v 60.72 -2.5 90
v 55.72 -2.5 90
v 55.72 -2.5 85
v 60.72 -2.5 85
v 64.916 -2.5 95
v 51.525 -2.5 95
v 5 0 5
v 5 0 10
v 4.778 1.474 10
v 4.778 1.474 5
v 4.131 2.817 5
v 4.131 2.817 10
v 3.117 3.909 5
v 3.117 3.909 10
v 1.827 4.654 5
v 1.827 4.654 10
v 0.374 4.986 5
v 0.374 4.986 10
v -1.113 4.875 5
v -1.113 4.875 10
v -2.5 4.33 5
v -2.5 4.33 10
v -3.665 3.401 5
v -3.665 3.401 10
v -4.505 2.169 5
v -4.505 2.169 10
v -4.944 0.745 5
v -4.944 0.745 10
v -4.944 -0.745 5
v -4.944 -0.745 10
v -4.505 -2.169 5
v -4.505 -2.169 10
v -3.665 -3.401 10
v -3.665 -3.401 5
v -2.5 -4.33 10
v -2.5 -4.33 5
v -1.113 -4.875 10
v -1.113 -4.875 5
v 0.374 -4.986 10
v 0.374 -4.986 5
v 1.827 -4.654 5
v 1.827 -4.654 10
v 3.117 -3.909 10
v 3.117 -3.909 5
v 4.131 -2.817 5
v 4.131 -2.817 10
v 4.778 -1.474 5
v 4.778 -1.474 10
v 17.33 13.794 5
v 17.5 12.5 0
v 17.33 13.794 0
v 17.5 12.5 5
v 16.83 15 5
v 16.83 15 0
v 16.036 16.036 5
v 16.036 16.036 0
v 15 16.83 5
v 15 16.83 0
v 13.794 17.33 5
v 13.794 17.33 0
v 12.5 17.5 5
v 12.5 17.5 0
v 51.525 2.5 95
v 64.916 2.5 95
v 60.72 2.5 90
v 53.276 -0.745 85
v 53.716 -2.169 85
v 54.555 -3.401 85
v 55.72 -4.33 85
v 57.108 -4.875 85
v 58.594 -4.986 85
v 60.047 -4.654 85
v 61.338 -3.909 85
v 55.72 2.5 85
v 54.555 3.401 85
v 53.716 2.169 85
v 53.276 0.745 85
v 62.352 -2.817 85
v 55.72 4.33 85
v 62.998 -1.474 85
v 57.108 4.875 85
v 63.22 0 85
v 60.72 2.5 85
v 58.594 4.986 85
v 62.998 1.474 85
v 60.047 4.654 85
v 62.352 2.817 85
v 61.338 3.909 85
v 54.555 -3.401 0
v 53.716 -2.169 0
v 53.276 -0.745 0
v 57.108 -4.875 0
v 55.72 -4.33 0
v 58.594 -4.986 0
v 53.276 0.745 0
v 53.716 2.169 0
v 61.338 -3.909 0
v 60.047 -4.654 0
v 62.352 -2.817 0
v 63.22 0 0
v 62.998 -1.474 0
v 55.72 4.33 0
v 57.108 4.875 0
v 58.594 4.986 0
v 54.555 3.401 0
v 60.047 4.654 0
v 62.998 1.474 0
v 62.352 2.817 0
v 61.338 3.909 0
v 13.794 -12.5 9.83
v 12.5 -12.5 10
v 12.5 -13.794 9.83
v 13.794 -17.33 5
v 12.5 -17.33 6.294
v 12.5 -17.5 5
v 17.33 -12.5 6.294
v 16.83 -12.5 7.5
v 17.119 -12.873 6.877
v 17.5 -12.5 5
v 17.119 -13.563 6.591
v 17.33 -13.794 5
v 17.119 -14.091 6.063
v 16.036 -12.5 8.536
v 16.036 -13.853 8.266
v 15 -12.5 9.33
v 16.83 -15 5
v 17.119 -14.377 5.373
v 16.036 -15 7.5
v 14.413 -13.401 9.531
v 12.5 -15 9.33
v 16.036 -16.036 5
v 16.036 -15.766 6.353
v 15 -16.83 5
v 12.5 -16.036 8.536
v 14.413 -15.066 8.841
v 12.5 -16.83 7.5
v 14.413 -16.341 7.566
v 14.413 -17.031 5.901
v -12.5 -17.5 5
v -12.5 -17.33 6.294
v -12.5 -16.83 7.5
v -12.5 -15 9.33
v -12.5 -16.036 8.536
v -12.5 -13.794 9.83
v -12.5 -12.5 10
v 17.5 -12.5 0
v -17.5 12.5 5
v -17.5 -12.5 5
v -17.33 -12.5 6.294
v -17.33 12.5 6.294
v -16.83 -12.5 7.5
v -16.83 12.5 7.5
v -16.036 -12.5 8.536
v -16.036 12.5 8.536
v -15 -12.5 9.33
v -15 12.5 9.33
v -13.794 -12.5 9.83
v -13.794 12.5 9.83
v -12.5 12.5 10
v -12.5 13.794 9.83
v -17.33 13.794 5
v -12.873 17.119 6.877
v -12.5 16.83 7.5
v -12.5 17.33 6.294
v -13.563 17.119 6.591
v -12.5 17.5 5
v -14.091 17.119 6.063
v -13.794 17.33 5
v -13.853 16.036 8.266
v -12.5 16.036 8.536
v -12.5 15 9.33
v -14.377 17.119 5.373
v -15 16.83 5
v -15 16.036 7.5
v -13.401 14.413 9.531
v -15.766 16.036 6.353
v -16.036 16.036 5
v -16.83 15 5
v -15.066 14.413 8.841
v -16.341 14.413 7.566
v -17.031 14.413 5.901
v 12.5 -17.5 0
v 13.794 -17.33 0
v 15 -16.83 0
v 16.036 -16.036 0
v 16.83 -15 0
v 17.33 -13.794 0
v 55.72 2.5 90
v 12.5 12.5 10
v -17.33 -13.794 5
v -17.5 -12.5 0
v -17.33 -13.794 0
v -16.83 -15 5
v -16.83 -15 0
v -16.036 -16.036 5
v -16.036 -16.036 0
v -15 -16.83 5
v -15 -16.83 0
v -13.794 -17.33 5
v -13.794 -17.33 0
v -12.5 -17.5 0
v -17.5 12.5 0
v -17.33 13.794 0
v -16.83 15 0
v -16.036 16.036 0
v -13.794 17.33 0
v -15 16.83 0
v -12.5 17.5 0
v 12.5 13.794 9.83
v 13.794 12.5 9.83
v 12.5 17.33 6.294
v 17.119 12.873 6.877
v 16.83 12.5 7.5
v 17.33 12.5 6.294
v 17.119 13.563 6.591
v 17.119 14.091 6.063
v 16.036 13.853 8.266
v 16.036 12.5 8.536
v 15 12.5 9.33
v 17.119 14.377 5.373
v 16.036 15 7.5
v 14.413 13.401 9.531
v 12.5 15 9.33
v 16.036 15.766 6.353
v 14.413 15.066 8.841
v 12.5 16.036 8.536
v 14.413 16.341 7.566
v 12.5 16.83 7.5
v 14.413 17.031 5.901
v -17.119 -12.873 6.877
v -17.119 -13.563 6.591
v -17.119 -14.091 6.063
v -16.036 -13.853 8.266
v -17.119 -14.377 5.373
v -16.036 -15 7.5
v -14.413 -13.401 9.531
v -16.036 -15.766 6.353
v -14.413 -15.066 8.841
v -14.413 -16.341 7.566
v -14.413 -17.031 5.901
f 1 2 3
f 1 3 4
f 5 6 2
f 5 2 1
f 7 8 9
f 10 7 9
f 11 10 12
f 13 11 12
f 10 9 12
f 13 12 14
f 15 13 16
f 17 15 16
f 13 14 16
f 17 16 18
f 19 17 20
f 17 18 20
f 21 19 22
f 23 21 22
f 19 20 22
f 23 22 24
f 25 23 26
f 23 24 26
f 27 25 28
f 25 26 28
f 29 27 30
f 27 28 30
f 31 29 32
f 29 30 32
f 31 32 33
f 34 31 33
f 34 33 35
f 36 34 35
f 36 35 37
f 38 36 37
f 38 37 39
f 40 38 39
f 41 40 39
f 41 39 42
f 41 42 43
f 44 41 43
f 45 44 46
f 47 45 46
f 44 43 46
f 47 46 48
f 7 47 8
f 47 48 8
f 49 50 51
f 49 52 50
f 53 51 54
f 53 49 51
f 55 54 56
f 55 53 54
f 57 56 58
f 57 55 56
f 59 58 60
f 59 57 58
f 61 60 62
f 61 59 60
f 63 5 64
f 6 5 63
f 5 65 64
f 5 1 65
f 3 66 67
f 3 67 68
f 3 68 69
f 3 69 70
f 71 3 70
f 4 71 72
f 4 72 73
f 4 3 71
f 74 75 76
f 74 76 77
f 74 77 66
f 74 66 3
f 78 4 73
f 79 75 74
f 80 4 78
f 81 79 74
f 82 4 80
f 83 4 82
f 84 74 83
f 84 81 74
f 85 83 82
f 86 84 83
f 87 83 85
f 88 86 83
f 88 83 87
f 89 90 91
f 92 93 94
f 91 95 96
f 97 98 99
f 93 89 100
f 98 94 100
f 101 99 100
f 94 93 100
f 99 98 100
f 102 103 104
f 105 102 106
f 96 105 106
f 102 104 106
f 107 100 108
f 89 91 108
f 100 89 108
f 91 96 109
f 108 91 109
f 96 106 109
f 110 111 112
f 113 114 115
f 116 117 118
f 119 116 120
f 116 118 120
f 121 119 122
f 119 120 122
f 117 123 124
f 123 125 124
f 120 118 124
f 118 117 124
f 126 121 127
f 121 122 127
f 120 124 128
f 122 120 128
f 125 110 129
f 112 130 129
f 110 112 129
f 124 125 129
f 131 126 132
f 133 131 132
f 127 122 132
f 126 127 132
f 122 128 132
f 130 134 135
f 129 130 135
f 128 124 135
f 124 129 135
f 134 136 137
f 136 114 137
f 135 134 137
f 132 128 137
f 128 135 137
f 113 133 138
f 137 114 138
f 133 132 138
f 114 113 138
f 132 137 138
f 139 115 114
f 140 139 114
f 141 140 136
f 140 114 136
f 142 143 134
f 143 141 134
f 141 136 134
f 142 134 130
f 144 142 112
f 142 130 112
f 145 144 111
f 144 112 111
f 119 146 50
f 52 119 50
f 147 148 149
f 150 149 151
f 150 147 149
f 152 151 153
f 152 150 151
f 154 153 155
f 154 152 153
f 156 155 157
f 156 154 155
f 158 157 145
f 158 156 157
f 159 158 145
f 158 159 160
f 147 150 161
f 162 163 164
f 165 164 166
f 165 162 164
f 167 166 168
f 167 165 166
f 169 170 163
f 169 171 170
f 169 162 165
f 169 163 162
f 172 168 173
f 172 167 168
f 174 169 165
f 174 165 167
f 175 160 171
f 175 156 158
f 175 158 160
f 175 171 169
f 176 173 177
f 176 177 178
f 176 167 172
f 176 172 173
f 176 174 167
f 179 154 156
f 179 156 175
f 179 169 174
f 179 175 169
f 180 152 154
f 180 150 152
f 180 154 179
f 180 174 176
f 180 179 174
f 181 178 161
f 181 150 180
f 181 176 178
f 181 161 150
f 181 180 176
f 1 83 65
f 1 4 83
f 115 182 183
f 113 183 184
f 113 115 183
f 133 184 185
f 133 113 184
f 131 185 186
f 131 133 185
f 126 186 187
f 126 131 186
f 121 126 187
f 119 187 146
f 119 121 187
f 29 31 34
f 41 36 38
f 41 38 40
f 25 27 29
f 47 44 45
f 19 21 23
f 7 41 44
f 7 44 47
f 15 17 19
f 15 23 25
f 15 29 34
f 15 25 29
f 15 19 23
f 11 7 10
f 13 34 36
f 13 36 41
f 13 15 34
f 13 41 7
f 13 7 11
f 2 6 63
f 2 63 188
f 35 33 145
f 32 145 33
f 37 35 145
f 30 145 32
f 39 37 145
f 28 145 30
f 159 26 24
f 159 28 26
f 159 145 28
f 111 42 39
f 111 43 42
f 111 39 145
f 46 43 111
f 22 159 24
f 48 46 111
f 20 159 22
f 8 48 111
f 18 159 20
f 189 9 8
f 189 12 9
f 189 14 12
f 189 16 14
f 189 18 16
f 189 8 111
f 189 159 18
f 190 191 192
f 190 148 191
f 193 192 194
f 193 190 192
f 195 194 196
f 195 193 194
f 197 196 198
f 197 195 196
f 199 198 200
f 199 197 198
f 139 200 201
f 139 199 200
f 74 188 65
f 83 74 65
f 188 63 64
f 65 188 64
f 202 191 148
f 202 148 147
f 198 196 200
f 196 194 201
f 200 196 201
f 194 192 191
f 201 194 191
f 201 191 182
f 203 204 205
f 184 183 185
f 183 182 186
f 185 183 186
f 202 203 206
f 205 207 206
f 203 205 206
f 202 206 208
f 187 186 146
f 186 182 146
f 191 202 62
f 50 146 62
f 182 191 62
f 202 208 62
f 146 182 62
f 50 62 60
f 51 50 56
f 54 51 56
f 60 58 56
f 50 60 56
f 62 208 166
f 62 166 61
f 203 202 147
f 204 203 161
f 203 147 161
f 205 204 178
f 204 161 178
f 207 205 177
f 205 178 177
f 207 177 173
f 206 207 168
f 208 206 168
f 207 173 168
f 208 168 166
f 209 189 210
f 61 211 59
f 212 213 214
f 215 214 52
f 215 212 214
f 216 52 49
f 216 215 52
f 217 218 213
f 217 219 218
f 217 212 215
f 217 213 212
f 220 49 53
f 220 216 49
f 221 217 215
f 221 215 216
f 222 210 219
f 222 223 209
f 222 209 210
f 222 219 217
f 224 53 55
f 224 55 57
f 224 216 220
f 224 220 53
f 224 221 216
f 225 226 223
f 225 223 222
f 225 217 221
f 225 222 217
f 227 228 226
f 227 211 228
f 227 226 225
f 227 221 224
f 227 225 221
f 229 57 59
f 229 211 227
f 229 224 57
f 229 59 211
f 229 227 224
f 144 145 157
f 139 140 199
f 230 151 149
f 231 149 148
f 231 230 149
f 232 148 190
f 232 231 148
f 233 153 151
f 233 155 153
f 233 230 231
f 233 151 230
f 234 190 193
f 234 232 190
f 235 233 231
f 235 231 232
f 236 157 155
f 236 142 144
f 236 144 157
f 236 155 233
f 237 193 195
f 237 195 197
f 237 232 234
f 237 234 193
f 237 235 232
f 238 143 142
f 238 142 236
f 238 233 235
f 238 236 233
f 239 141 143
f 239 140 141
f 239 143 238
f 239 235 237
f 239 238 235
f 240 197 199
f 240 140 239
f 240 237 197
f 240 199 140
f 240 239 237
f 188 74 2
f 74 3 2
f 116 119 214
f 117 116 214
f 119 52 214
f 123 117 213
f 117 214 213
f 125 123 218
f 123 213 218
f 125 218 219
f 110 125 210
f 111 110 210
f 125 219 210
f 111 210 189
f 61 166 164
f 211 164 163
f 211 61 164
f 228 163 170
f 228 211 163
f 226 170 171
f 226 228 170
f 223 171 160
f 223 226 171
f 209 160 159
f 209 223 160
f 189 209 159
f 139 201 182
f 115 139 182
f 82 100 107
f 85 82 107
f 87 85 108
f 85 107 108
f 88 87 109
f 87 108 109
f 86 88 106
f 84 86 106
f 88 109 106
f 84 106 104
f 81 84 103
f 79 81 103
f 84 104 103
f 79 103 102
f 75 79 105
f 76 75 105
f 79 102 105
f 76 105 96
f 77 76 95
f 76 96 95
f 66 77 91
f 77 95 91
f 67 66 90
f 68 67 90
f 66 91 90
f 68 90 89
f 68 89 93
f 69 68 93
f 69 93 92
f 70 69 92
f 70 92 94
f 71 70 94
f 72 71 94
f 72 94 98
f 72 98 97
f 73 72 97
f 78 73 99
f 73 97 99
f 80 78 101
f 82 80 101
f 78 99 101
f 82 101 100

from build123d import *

# Parameters (mm, degrees)
F0_W     = 35
F0_H     = 35
F1_DEPTH = 10
F2_R     = 5
F3_R     = 5
F4_DEPTH = 5
F5_R     = 5
F6_DEPTH = 85
F7_W     = 5
F7_H     = 5
F8_DEPTH = 2.5


with BuildPart() as f1:
    # F0 (on Top) → F1 (new body)
    with BuildSketch(Plane.XY):
        Rectangle(F0_W, F0_H)
    extrude(amount=F1_DEPTH)

    # F2
    f2_edges = [f1.edges().sort_by_distance(p)[0] for p in [
        (0, -17.5, 10),
        (-17.5, 0, 10),
        (0, 17.5, 10),
        (17.5, 0, 10),
        (-17.5, -17.5, 5),
        (17.5, -17.5, 5),
        (17.5, 17.5, 5),
        (-17.5, 17.5, 5),
    ]]
    fillet(f2_edges, radius=F2_R)

    # F3 (on face) → F4 (cut)
    with BuildSketch(Plane.XY.offset(10)):
        Circle(F3_R)
    extrude(amount=-F4_DEPTH, mode=Mode.SUBTRACT)


with BuildPart() as f6:
    # F5 (on Top) → F6 (new body)
    with BuildSketch(Plane.XY):
        with Locations((58.220385, 0)):
            Circle(F5_R)
    extrude(amount=F6_DEPTH)

    # F7 (on Front) → F8 (join, symmetric)
    with BuildSketch(Plane.XZ):
        Polygon((55.720385, 90), (60.720385, 90), (64.915883, 95), (51.524887, 95), align=None)
        with Locations((58.220385, 87.5)):
            Rectangle(F7_W, F7_H)
    extrude(amount=F8_DEPTH, both=True)


solid = Compound([f1.part, f6.part])
